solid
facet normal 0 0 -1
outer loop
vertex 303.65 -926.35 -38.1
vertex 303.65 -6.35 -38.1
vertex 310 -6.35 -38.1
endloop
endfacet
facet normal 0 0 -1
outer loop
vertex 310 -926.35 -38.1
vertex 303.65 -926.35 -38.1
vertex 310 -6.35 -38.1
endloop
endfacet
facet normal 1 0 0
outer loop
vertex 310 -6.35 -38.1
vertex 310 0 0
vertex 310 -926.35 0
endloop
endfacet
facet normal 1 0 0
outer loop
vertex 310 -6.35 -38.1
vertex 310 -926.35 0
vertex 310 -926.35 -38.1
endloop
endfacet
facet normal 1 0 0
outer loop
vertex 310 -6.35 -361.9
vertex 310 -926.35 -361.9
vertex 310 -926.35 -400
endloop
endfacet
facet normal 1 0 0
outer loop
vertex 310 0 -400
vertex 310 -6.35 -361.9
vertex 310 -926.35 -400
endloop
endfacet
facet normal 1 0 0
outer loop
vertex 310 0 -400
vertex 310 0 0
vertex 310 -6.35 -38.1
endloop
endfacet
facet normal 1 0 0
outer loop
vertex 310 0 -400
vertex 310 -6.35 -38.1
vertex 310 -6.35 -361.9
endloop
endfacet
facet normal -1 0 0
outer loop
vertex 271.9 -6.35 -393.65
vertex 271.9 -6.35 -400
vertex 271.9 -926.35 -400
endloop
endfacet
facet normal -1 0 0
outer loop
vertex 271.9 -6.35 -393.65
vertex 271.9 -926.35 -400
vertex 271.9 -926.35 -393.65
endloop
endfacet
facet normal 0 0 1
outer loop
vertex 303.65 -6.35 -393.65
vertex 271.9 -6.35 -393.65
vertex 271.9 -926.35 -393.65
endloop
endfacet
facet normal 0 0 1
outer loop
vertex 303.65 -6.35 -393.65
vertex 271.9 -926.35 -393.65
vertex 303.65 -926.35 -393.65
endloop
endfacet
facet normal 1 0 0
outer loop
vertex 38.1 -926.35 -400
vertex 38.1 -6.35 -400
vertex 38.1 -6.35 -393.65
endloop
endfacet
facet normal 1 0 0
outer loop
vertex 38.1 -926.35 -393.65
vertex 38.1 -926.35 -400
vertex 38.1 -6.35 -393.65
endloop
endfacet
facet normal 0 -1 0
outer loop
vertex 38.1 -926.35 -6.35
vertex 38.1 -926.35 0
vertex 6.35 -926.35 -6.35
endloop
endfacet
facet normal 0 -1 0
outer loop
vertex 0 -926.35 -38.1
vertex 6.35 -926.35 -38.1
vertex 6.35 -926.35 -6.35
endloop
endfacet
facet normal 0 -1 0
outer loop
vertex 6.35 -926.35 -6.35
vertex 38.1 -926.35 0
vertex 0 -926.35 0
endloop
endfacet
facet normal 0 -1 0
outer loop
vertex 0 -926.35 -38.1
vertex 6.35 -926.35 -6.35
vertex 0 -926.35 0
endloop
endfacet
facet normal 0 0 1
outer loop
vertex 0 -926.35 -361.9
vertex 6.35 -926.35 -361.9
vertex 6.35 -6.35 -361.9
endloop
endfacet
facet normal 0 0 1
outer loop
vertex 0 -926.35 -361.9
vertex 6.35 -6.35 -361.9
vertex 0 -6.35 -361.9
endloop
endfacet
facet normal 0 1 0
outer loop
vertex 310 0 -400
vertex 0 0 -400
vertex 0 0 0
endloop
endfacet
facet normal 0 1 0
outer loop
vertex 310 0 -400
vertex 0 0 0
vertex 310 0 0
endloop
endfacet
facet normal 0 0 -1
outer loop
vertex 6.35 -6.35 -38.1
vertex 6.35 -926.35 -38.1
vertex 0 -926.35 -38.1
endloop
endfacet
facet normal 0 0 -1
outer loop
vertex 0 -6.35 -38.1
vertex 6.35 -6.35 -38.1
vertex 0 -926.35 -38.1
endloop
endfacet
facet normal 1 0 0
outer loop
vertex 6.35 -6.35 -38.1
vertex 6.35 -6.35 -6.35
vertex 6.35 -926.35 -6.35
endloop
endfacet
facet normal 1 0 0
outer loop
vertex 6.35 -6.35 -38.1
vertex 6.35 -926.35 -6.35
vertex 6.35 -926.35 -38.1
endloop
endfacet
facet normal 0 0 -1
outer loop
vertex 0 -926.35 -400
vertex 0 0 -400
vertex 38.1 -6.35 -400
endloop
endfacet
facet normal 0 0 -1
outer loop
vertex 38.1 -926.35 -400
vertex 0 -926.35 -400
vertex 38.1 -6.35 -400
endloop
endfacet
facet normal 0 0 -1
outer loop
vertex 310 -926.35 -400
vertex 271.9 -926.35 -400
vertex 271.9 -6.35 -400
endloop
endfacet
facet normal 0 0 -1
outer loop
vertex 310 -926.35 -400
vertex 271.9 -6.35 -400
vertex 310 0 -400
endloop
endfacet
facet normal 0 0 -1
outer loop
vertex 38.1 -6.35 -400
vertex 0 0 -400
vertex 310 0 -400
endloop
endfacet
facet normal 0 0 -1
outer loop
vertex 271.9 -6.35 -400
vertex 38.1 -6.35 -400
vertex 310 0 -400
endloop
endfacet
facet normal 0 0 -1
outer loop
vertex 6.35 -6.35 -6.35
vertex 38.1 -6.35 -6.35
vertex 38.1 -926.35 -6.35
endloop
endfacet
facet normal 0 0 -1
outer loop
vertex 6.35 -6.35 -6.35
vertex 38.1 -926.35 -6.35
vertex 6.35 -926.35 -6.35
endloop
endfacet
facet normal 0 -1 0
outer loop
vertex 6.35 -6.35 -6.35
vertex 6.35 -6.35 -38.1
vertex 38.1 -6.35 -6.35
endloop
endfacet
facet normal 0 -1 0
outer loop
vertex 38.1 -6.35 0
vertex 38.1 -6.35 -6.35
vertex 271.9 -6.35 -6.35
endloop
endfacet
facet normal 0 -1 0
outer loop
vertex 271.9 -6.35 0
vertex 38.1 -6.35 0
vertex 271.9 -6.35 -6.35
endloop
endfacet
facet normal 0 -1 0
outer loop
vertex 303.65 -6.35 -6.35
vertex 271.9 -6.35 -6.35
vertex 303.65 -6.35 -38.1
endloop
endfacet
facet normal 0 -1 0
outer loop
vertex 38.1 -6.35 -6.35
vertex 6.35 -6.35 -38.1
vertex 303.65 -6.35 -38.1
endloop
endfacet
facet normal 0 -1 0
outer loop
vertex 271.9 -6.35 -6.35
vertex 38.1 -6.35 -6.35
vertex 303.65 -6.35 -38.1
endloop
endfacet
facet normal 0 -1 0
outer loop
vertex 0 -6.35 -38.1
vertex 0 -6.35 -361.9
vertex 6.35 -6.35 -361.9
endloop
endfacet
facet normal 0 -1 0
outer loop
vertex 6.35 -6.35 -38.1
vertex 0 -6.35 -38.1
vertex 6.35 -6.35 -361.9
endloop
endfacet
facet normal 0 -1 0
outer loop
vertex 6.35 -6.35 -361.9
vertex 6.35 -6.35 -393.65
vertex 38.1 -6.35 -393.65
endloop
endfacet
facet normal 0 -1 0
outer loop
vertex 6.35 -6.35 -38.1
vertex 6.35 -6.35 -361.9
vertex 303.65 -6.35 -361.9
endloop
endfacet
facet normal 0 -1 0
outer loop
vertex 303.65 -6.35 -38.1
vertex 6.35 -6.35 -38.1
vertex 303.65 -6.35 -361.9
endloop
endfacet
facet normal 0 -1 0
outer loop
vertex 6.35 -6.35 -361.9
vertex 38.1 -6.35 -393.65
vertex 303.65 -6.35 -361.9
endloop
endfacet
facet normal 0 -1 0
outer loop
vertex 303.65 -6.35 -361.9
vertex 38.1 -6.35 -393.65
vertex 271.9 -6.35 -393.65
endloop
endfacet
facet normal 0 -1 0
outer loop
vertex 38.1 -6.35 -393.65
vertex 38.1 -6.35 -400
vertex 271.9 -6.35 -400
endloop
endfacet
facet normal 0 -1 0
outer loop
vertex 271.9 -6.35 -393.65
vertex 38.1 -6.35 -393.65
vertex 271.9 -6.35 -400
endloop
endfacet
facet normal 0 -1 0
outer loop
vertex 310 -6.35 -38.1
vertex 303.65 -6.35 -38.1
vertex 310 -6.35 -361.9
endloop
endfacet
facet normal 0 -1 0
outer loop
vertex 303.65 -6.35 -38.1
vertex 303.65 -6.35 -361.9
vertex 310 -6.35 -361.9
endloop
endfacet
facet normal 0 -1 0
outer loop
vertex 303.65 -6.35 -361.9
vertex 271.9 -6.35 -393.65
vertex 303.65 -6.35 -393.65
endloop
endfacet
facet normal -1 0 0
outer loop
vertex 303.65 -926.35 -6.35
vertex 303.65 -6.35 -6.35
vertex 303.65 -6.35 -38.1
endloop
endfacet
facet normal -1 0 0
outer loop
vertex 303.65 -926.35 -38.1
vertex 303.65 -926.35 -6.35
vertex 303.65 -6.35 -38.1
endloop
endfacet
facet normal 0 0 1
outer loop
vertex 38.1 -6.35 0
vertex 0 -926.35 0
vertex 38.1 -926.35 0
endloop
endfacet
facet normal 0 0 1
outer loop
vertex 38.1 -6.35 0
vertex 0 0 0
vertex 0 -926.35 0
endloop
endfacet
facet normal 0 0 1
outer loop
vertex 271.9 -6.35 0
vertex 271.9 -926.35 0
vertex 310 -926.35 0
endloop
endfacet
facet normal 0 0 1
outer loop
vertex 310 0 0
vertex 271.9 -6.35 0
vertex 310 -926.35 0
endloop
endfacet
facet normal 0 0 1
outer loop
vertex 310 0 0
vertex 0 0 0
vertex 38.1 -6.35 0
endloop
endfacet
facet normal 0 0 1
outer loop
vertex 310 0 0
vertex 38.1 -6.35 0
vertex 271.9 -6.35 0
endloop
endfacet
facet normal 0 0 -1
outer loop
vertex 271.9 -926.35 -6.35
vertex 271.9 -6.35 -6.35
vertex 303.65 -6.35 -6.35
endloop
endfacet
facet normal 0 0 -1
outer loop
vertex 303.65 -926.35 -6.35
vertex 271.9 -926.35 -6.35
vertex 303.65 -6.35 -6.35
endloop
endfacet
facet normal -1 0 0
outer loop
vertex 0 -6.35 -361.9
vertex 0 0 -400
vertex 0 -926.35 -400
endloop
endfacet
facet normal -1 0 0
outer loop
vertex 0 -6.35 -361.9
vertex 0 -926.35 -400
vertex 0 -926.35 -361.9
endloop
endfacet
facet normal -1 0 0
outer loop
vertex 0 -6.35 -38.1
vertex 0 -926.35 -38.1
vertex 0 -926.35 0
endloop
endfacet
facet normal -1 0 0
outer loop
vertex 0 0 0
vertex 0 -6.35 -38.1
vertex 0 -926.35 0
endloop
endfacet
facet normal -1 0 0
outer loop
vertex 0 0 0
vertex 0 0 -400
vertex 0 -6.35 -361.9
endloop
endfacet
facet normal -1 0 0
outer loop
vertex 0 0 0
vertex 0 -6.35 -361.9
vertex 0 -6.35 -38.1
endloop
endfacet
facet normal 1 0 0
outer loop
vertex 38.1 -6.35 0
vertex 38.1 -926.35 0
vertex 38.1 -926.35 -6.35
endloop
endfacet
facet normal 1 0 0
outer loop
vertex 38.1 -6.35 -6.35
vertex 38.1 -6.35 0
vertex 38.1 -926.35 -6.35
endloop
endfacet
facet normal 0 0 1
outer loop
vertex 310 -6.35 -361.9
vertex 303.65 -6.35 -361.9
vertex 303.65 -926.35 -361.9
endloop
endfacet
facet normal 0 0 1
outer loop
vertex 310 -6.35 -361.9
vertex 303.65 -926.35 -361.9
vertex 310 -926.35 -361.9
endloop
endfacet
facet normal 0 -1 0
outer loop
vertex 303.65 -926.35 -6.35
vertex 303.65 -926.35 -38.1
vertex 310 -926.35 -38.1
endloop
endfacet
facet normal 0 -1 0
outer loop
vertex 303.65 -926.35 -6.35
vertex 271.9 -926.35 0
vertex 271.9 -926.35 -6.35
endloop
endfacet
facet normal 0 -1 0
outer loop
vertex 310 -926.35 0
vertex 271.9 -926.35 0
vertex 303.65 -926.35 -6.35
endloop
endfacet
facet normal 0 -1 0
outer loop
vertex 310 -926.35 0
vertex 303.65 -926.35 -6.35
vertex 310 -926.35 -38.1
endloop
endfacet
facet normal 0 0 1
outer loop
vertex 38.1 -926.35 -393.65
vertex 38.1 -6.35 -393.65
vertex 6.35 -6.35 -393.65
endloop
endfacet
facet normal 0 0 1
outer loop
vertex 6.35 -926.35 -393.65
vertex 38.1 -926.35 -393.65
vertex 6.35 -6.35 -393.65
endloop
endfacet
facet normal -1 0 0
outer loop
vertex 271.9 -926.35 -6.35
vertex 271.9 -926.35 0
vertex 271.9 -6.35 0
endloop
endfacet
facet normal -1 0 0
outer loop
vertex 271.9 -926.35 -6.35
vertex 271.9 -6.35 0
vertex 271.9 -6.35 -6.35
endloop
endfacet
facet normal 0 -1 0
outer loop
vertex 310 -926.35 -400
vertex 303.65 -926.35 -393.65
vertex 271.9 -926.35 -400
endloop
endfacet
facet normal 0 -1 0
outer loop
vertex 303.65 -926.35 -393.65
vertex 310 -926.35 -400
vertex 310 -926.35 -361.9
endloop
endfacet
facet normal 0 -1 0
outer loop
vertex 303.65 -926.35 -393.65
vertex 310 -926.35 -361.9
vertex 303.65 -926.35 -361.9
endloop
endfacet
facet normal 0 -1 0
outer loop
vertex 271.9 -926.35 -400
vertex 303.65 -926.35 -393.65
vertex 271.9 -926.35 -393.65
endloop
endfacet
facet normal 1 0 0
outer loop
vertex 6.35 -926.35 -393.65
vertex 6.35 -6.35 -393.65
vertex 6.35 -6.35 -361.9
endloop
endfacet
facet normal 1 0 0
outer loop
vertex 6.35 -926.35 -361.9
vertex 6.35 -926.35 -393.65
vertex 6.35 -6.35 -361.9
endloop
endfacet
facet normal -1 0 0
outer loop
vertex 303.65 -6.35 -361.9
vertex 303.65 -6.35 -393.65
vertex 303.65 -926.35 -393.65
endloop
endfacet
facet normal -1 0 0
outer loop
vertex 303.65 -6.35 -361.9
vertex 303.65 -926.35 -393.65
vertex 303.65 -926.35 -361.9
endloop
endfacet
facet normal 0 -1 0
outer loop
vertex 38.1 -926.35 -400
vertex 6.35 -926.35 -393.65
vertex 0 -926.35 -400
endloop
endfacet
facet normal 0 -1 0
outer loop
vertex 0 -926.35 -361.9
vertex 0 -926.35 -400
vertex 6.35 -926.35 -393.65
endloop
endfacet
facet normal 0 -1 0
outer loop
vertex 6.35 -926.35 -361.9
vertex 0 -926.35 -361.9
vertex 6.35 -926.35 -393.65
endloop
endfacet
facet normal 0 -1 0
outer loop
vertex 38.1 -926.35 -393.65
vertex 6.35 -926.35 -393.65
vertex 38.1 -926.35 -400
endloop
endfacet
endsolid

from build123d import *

# Parameters (mm, degrees)
CROQUIS2_W              = 310
CROQUIS2_H              = 400
SALIENTE_EXTRUIR1_DEPTH = 6.35
SALIENTE_EXTRUIR2_DEPTH = 920


with BuildPart() as part:
    # Croquis2 → Saliente-Extruir1 (new body)
    with BuildSketch(Plane(origin=(0, 0, 0), x_dir=(1, 0, 0), z_dir=(0, 1, 0))):
        with Locations((155, 200)):
            Rectangle(CROQUIS2_W, CROQUIS2_H)
    extrude(amount=-SALIENTE_EXTRUIR1_DEPTH)

    # Croquis3 → Saliente-Extruir2 (add)
    with BuildSketch(Plane.XZ.offset(6.35)):
        Polygon((0, 0), (38.1, 0), (38.1, -6.35), (6.35, -6.35), (6.35, -38.1), (0, -38.1), align=None)
        Polygon((303.65, -38.1), (310, -38.1), (310, 0), (271.9, 0), (271.9, -6.35), (303.65, -6.35), align=None)
        Polygon((310, -400), (271.9, -400), (271.9, -393.65), (303.65, -393.65), (303.65, -361.9), (310, -361.9), align=None)
        Polygon((6.35, -361.9), (0, -361.9), (0, -400), (38.1, -400), (38.1, -393.65), (6.35, -393.65), align=None)
    extrude(amount=SALIENTE_EXTRUIR2_DEPTH)


solid = part.part
